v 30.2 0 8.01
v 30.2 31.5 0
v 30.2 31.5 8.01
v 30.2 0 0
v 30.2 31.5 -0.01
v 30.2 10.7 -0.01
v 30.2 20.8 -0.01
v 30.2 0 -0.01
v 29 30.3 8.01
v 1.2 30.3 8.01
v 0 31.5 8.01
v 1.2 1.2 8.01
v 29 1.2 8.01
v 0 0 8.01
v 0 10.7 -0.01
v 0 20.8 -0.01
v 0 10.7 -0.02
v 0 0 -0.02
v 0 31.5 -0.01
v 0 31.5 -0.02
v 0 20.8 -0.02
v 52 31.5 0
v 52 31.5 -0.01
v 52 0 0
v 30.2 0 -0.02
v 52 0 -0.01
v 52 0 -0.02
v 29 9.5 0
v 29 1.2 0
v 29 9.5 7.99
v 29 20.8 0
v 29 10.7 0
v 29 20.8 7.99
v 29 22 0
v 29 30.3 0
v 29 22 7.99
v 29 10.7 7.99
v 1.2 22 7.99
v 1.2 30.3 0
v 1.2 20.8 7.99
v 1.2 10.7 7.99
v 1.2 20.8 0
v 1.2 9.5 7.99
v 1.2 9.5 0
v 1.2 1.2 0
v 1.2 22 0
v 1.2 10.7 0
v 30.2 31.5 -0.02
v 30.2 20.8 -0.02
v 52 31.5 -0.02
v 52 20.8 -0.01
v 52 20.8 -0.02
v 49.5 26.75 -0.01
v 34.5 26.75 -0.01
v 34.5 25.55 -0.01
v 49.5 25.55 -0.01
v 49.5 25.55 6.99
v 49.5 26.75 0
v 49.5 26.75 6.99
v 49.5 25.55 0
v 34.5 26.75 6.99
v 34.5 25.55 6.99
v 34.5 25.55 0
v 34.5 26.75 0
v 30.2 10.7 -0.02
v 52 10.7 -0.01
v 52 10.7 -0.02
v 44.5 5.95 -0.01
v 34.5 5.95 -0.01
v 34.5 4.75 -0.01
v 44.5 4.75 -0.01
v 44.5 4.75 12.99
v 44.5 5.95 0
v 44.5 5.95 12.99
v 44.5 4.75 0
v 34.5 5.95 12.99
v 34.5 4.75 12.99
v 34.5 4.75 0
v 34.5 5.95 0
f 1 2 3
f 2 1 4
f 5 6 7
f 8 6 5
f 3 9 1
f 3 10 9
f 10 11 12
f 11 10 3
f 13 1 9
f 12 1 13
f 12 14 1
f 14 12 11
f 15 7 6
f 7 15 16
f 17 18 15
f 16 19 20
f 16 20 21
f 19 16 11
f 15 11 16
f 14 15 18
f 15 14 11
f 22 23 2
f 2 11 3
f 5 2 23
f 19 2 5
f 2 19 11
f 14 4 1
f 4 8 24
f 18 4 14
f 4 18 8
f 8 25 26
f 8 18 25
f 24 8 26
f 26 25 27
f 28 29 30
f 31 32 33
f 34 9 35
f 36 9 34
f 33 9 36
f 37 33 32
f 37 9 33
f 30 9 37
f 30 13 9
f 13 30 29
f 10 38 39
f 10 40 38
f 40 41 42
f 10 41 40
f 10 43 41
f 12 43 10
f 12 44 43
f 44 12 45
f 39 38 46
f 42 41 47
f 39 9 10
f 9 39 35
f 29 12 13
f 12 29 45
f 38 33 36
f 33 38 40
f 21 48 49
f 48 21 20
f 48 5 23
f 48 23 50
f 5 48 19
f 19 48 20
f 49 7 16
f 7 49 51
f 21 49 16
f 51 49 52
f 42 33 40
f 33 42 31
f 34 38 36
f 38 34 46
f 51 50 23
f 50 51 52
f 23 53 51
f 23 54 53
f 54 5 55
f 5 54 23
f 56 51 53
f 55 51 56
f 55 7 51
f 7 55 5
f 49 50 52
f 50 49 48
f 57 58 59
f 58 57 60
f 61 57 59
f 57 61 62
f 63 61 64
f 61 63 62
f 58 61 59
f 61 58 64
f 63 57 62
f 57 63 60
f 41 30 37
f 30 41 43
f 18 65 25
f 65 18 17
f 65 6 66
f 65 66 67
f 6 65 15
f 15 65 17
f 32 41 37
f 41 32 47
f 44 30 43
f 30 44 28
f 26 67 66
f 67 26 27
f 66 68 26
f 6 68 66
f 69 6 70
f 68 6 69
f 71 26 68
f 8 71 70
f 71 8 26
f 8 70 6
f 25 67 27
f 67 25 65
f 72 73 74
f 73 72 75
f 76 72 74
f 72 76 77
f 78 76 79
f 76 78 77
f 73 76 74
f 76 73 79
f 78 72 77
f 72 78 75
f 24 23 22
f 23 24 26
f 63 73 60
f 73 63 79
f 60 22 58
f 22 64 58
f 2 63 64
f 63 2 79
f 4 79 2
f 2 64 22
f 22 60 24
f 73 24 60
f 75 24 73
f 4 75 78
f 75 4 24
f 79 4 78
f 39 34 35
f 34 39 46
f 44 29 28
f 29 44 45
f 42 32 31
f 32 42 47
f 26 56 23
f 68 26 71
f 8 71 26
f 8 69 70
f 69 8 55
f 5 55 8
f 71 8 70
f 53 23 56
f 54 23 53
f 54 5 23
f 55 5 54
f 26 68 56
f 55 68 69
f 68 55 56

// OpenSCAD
// file: ../Base/Boxes.scad
// Fischertechnik Box Foundation
// Pre-designed Boxes

use <Constants.scad>

include <PlacementOptions.scad>

box190Width = 190;
box190Depth = 130;
box130Width = 130;
box130Depth = 95;
boxUsageHeight = 33.9;
boxWallThickness = 2.4;
boxBaseThickness = 1.0;
boxWebWidth = 3.0;

// getBoxWallThickness()
// Gets the wall thickness of a Fischertechnik Box

function getBoxWallThickness() = boxWallThickness;

// Gets the usable height of a fischertechnik box
function getBoxUsageHeight() = boxUsageHeight;

// Gets the thickness of the Fischertechnik box base.
function getBoxBaseThickness() = boxBaseThickness;

// Gets the width of a box web
function getBoxWebWidth() = boxWebWidth;

// Gets the usable inner space of a Box 190 as an x/y-list
function getBox190Space() = [
    box190Width - 2*getBoxWallThickness(), 
    box190Depth - 2*getBoxWallThickness() ];

// Imports the Fischertechnik empty box 130x190 mm and places it at position 0,0
// 190x130 are the outer sizes, the inner space is slightly smaller. Use getBox190Space() to get the inner sizes.
// This module needs the STL file "Fischertechnik Box 130x190.stl" in the library path.
// The box is positioned that the usable inner space is at the 0,0,0 position. The

module Box190() {
    translate([-getBoxWallThickness(),-getBoxWallThickness(),-getBoxBaseThickness()])
        import("Fischertechnik Box 130x190.stl", convexity=3);
}

// Gets the usable inner space of a Box 130 as an x/y-list
function getBox130Space() = [
    box130Width - 2*getBoxWallThickness(), 
    box130Depth - 2*getBoxWallThickness() ];

// Imports the Fischertechnik empty box 95x130 mm and places it at position 0,0
// 190x130 are the outer sizes, the inner space is slightly smaller. Use getBox190Space() to get the inner sizes.
// This module needs the STL file "Fischertechnik Box 95x130.stl" in the library path.
// The box is positioned that the usable inner space is at the 0,0,0 position. The

module Box130() {
    translate([-getBoxWallThickness(),-getBoxWallThickness(),-getBoxBaseThickness()])
        import("Fischertechnik Box 95x130.stl", convexity=3);
}

// Creates a web at the specified box walls
// corner 0 = LowerLeft, 1 = UpperLeft, 2 = UpperRight, 3 = LowerRight
// side 0 = LeftOfCorner, 1 = RightOfCorner
// distance = Distance in mm from the corner
// box = inner width and depth of the box (default: Box 190)
// webWidth = length of the web (default is 3 mms)
// webThickness = thickness of the web (default is 1 mm)

module BoxWeb(corner, side, distance, box=getBox190Space(), webWidth=getBoxWebWidth(), webThickness=1.0) {
    sink = getBoxWallThickness()/2;

    width = (corner % 2 == 0) ? 
            (side == LeftOfCorner ? webWidth : webThickness) :
            (side == LeftOfCorner ? webThickness : webWidth);

    depth = (corner % 2 == 0) ? 
            (side == RightOfCorner ? webWidth : webThickness) :
            (side == RightOfCorner ? webThickness : webWidth);
    
    xDiff = corner == LowerLeft ? 
                (side == LeftOfCorner ? -sink : distance) :
            (corner == UpperLeft ?                
                (side == LeftOfCorner ? distance : -sink) :
            (corner == UpperRight ?
                (side == LeftOfCorner ? box.x-webWidth+sink : box.x-distance-webThickness) :
                (side == LeftOfCorner ? box.x-distance-webThickness: box.x-webWidth+sink)));

    yDiff = corner == LowerLeft ? 
                (side == RightOfCorner ? -sink : distance) :
            (corner == UpperLeft ?
                (side == RightOfCorner ? box.y-distance : box.y-webWidth+sink) :
            (corner == UpperRight ?
                (side == RightOfCorner ? box.y-webWidth+sink : box.y-distance) :
                (side == RightOfCorner ? distance : -sink)));
    
    translate([xDiff, yDiff, -getExcess()])
        cube([width, depth, boxUsageHeight + 2*getExcess()]);
}
// file: ../Base/Alignment.scad
// Fischertechnik Box Foundation
// Geometry Helpers Alignment

include <PlacementOptions.scad>

// getAlignedX(elementWidth, spaceWidth, align=AlignRight, offset=0)
// Gets the aligned X offset of an element with the given
// width in the given space.
// elementWidth = The width of the element to positon
// spaceWidth = The space where the element should be aligned
// align = 0 AlignLeft, 1 AlignCenter, 2 AlignRight
// offset = an optional offset from the aligned position. When
// aligned left or centered, then positive values are in X direction.
// When aligned right then positive values are in negative X direction.

function getAlignedX(elementWidth, spaceWidth, align=AlignRight, offset=0) =
    (align == AlignLeft) ?
        offset :
        ((align == AlignCenter) ?
        (spaceWidth - elementWidth)/2 + offset :
        spaceWidth - offset - elementWidth);

// getAlignedY(elementDepth, spaceDepth, align=AlignTop, offset=0)
// Gets the aligned Y offset of an element with the given
// depth in the given space.
// elementDepth = The depth of the element to positon
// spaceDepth = The space where the element should be aligned
// align = 0 AlignBottom, 1 AlignCenter, 2 AlignTop
// offset = an optional offset from the aligned position. When
// aligned bottom or centered, then positive values are in Y direction.
// When aligned top then positive values are in negative Y direction.

function getAlignedY(elementDepth, spaceDepth, align=AlignTop, offset=0) =
    (align == AlignBottom) ?
        offset :
        ((align == AlignCenter) ?
        (spaceDepth - elementDepth)/2 + offset :
        spaceDepth - offset - elementDepth);
// file: ../Base/Rotation.scad
// Fischertechnik Box Foundation
// Geometry Helpers Rotation

include <PlacementOptions.scad>

// getRotatedSpace(space, rotation=NoRotation)
// Rotates the space dependent on the specified rotation

function getRotatedSpace(space, rotation=NoRotation) = [
    (rotation == Rotate90 || rotation == Rotate270) ? space.y : space.x,
    (rotation == Rotate90 || rotation == Rotate270) ? space.x : space.y
];

// Rotates the given space around the fixed left lower corner
// space = the space the children needs as width/depth list [width,depth]
// rotation = 0 Rotate0 degrees, 1 Rotate90 degrees, 2 Rotate180 degrees, 3 Rotate270 degrees (equivalent to -90)

module RotateFix(space, rotation=Rotate0) {
    dy = (rotation == Rotate0 || rotation == Rotate270) ? 0 :
        (rotation == Rotate90) ? space.x :
        space.y;
    dx = (rotation < Rotate180) ? 0 :
        (rotation == Rotate180) ? space.x :
        space.y;
    
    translate([dx, dy, 0])
        rotate([0, 0, rotations[rotation]])
            children();
}
// file: ../Base/Placement.scad
// Fischertechnik Box Foundation
// Geometry Helpers Placement

use <Constants.scad>
use <Alignment.scad>
use <Rotation.scad>
use <Boxes.scad>

include <PlacementOptions.scad>

// Place(x=0, y=0, elementSpace=[0,0], alignX=AlignLeft, alignY=AlignBottom, rotation=Rotate0, boxSpace=getBox190Space())
// Places the child at the specified position
// y = Y-Position. This is a relative position when an X aligment is specified.
// x = X-Position. This is a relative position when an Y aligment is specified.
// elementSpace = space of the element to be placed [x,y]
// alignX = -1=NoAlign, 0 AlignLeft, 1 AlignCenter, 3 AlignRight (elementSpace and boxSpace required!)
// alignY = -1=NoAlign, 2 AlignBottom, 1 AlignCenter, 4 AlignTop (elementSpace and boxSpace required!)
// rotation = 0 Rotate0 0 degrees, 1 Rotate90 90 degrees, 
// 2 Rotate180 180 degrees, 3 Rotate270 270 degrees (equivalent to -90)
// boxSpace = Inner space of the box where the placement occurs [x,y] - default is Box 190x130 inner space

module Place(x=0, y=0, elementSpace=[0,0], 
  alignX=AlignLeft, alignY=AlignBottom, 
  rotation=NoRotation, boxSpace=getBox190Space()) {

    module Position(x, y, space, rotation=Rotate0) {
        translate([x, y, 0])
            RotateFix(space, rotation)
                children();
    }

    space = getRotatedSpace(elementSpace, rotation);
    alignedX = getAlignedX(space.x, boxSpace.x, alignX, x);
    alignedY = getAlignedY(space.y, boxSpace.y, alignY, y);
    Position(alignedX, alignedY, elementSpace, rotation)
        children();
}

// Center(space=getBox130Space(), elementSpace=[0,0])
// space = Space where the children is centered. For cylinder use centered=true and no elementSpace.
// elementSpace = space of the element to be centered [x,y]

module Center(space=getBox190Space(), elementSpace=[0,0]) {
    translate([(space.x - elementSpace.x) / 2, (space.y - elementSpace.y) / 2])
        children(0);
}

// CenterHorizontal(width=0, y=0, offset=0, space=getBox130Space())
// space = Space where the children is centered. For cylinder use centered=true and no elementSpace.
// elementSpace = space of the element to be centered [x,y]

module CenterHorizontal(width=0, y=0, offset=0, space=getBox190Space()) {
    translate([(space.x - width) / 2 + offset, y])
        children(0);
}

// CenterVertical(depth=0, x=0, offset=0, space=getBox130Space())
// space = Space where the children is centered. For cylinder use centered=true and no elementSpace.
// elementSpace = space of the element to be centered [x,y]

module CenterVertical(depth=0, x=0, offset=0, space=getBox190Space()) {
    translate([x, (space.y - depth) / 2 + offset])
        children(0);
}
// file: ../Base/PlacementOptions.scad
// Fischertechnik Box Foundation
// Placement Options

// Alignment
NoAlign = 0;
AlignLeft = 1;
AlignBottom = 2;
AlignCenter = 3;
AlignRight = 4;
AlignTop = 5;

// Element rotation degree steps
rotations = [0, -90, -180, -270];

// Rotation
NoRotation = 0;
Rotate0 = 0;
Rotate90 = 1;
Rotate180 = 2;
Rotate270 = 3;

// Docking (seen from above)
NoDock = -1;
DockLeft = 0;
DockTop = 1;
DockRight = 2;
DockCorner = 2;
DockBottom = 3;

// Web corners
LowerLeft = 0;
UpperLeft = 1;
UpperRight = 2;
LowerRight = 3;

// Web position relative to corner
LeftOfCorner = 0;
RightOfCorner = 1;
// file: FrameBracketWithoutWorm.scad
// Fischertechnik Box Library
// Frame  for bracket without worm
// 31046

use <../Base/Constants.scad>
use <../ModelBase/Complex.scad>

// getFrameBracketWithoutWormSpace()
// Gets the space for a frame for a bracket with worm.

function getFrameBracketWithoutWormSpace() = getFrameBracketSpace();

// FrameBracketWithoutWorm()
// Frame for bracket with worm.

module FrameBracketWithoutWorm() {
    FrameBracket([ 10, getDividerThickness(), 13 ]);
}

// Test
color("lightgray")
FrameBracketWithoutWorm();
// file: FrameBracketWithWorm.scad
// Fischertechnik Box Library
// Frame  for bracket with worm
// 31045

use <../Base/Constants.scad>
use <../ModelBase/Complex.scad>

// getFrameBracketWithWormSpace()
// Gets the space for a frame for a bracket with worm.

function getFrameBracketWithWormSpace() = getFrameBracketSpace();

// FrameBracketWithWorm()
// Frame for bracket with worm.

module FrameBracketWithWorm() {
    FrameBracket([ 15, getDividerThickness(), 7 ]);
}

// Test
color("lightgray")
FrameBracketWithWorm();
// file: ../Base/Deployment.scad
// Fischertechnik Box Foundation
// Geometry Helpers Deployment

use <Constants.scad>
use <Placement.scad>
use <Rotation.scad>

include <PlacementOptions.scad>

// getWidth(spaces, rotations, count, i=0)
// Gets the sum of the width of count specified spaces, including rotations for each space.
// spaces = List of spaces from which the width should be added. Used internally for DeployRow.
// rotations = specify rotations for each space to get its correct width
// count = The count of spaces from the specified spaces that should be included in the sum (for recursive call)
// i = The space index offset used to start to add (for recursive call)

function getWidth(spaces, rotations, count, i=0) = 
    (i < count) ? 
        getRotatedSpace(spaces[i], rotations[i]).x + getWidth(spaces, rotations, count, i+1) : 
        0;

// getX(spaces, rotations, distance, i)
// Calculates the X position of the space with the index i, when the spaces are placed with the given
// equal distances. Used internally for DeployRow.
// spaces = List of spaces from which the width should be added
// rotations = specify rotations for each space to get its correct width
// distance = Equal distance between each space
// i = Index of the space to get its X position for

function getX(spaces, rotations, distance, i) = 
    (i == 0) ? 
        0 :
        (getRotatedSpace(spaces[i-1], rotations[i-1]).x + distance + getX(spaces, rotations, distance, i-1));

// DeployHorizontal(width, spaces, rotations)
// Deploys the elements in the specified width with equal distances.
// rowWidth = The width of the row in mm.
// spaces = The spaces of all elements to deploy.
// rotations = The rotations of each element: 0 Rotate0 0 degrees, 1 Rotate90 90 degrees, 
// 2 Rotate180 180 degrees, 3 Rotate270 270 degrees (equivalent to -90).

module DeployHorizontal(rowWidth, spaces, rotations) {
    distance = (rowWidth - getWidth(spaces, rotations, len(spaces))) / (len(spaces)-1);
    
    for (i = [0:1:$children-1]) {
        x = getX(spaces, rotations, distance, i);
        translate([x, 0])
            RotateFix(spaces[i], rotations[i])
                children(i);
    }
}

// getDepth(spaces)
// Gets the sum of the depth of count specified spaces.
// spaces = List of spaces from which the width should be added. Used internally for DeployRow.
// rotations = specify rotations for each space to get its correct width
// count = The count of spaces from the specified spaces that should be included in the sum
// i = The space index offset used to start to add

function getDepthSum(spaces, i=0) = 
    (i < len(spaces)) ? 
        spaces[i].y + getDepthSum(spaces, i+1) : 
        0;

// getY(spaces, distance, i)
// Gets the Y-distance the spaces plus constant distance 
// between each space needs.
// spaces = Spaces of each element to deploy vertically. Only
// the depth (y) is used.
// distance = distance between each space when deployed.
// i = The highest index of the spaces used

function getY(spaces, distance, i) = 
    (i == 0) ? 
        0 :
        spaces[i].y + distance + getY(spaces, distance, i-1);

// DeployVertical(depth, spaces)
// Deploys the child elements in the specified depth vertically.
// depth = Depth of the space where the elements should be deployed.
// spaces = Spaces of all elements. Only the depth (y) will be used.

module DeployVertical(depth, spaces) {
    distance = (depth - getDepthSum(spaces)) / (len(spaces)-1);
    count = $children - 1;
    
    for (i = [0:1:$children-1]) {
        y = getY(spaces, distance, count-i);
        translate([0, y, -getExcess()])
            children(i);
    }
}

// DeploySame(space, elementSpace, columns=2, rows=1, rotation=Rotate0)
// Deploys columns and rows of the specified child in the specified space with
// equal distances
// space = The space where the element copies are deployed
// elementSpace = The space the child needs
// columns = Count of elements per row
// rows = Count of rows deployed
// rotation = The rotation of the child that will be applied

module DeploySame(space, elementSpace, columns=2, rows=1, rotation=Rotate0) {
    
    elementWidth = getRotatedSpace(elementSpace, rotation).x;
    columnDistance = (space.x - columns * elementWidth) / (columns > 1 ? columns - 1 : 1);
    endColumnOffset = space.x - elementWidth;
    columnOffsetStep = elementWidth + columnDistance;
    
    elementDepth = getRotatedSpace(elementSpace, rotation).y;
    rowDistance = (space.y - rows * elementDepth) / (rows > 1 ? rows - 1 : 1);
    endRowOffset = space.y - elementDepth;
    rowOffsetStep = elementDepth + rowDistance;
    
    for (rowOffset = [0:rowOffsetStep:endRowOffset]) {
        for (columnOffset = [0:columnOffsetStep:endColumnOffset]) {
            translate([columnOffset, rowOffset])
                RotateFix(elementSpace, rotation)
                    children(0);
        }
    }
}

// getMergedRowWidth(spaces, rotations, count, i=0)
// Gets the width of the merged spaces with the specified rotations.
// Merging works all elements with two frame walls. 
// The right and left walls are merged into one single wall.
// spaces = List of spaces from which the width should be added.
// rotations = specify rotations for each space to get its correct width
// count = The count of spaces from the specified spaces that should be included in the sum (for recursive call)
// i = The space index offset used to start to add (for recursive call)

function getMergedRowWidth(spaces, rotations, count, i=0) =
    (i < count) ? 
        getRotatedSpace(spaces[i], rotations[i]).x + getWidth(spaces, rotations, count, i+1) - (i > 0 ? getDividerThickness() : 0) : 
        0;

// MergeRow(spaces, rotations, dividerThickness=0.8)
// Deploys the children so that all walls of the neighbors are merged in a single common wall.
// spaces = List of spaces of the children to get the sizes from.
// rotations = specify rotations for each space to get its correct width
// dividerThickness = Thickness of all dividers of the elements (default is 0.8)

module MergeRow(spaces, rotations, dividerThickness = getDividerThickness()) {
    for (i = [0:1:$children-1]) {
        x = getX(spaces, rotations, -getDividerThickness(), i);
        translate([x, 0, 0])
            RotateFix(spaces[i], rotations[i])
                children(i);
    }
}

// Merge(count, space, rotation, dividerThickness=0.8)
// Deploys the child count times so that all walls of the neighbors are merged in a single common wall.
// space = Space of the child to get the sizes from.
// rotation = rotation of the child to get the correct width
// dividerThickness = Thickness of all dividers of the element (default is 0.8)

module Merge(count, space, rotation, dividerThickness = getDividerThickness()) {
    x = getRotatedSpace(space, rotation).x - getDividerThickness();
    for (offset = [0:x:(count-1)*x]) {
        echo(offset);
        translate([offset, 0, 0])
            RotateFix(space, rotation)
                children(0);
    }
}
// file: ../Base/Constants.scad
// Fischertechnik Box Foundation
// Constants

// Constant values necessary for multiple elements

// Base constants
dividerThickness = 1.2;
excess = 0.01;
fragments = 90;
tolerance = 0.8;

// Gets the thickness of a divider 
function getDividerThickness() = dividerThickness;

// Gets the excess that is used to merge walls into each other
function getExcess() = excess;

// Gets amount of fragments of a cylinder
function getFragments() = fragments;

// Gets the inner tolerance of a frame to each side
function getTolerance() = tolerance;


// Fischertechnik specific constants
axisDiameter = 4;
axisBottomDiameter = axisDiameter + 1;
standardEdgeDistance = 2.5;
standardWebDistance = 11.5;
standardCornerLength = 15;
tubeWallFactor = 0.8;

// Gets axis diameter
function getAxisDiameter() = axisDiameter;

// Gets axis bottom diameter for thicker part at the bottom
function getAxisBottomDiameter() = axisBottomDiameter;

// gets the standard distance to the wall of the box for dockable frames with webs
function getStandardEdgeDistance() = standardEdgeDistance;

// gets the standard distance of each web to the corner of the dockable frame
function getStandardWebDistance() = standardWebDistance;

// gets the standard length of the corner walls of a dockable frame
function getStandardCornerLength() = standardCornerLength;

// gets the wall thickness of a tube.
function getTubeWallThickness() = tubeWallFactor * getDividerThickness();
// main file
// Fischertechnik Box Library
// Frames for brackets with and without worm
// 31045 + 31046

use <../Base/Constants.scad>
use <../Base/Deployment.scad>
use <../ModelBase/Simple.scad>
use <../ModelBase/Complex.scad>
use <FrameBracketWithWorm.scad>
use <FrameBracketWithoutWorm.scad>

include <../Base/PlacementOptions.scad>

outerDepth = 31.5;

// getFrameBracketComboSpace()
// Gets the space for a frame for a combination of brackets with worm and without worm.

function getFrameBracketComboSpace() = [getFrameBracketSpace().x, outerDepth];

// FrameBracketCombo()
// Frame for a combination of brackets with worm and without worm.

module FrameBracketCombo() {
    Space(getFrameBracketComboSpace());
    Frame([getFrameBracketWidth(), outerDepth - 2*getDividerThickness() - getTolerance(), getFrameBracketSpace().z]);
    DeployVertical(outerDepth, [getFrameBracketWithWormSpace(), getFrameBracketWithoutWormSpace()]) {
        FrameBracketWithWorm();
        FrameBracketWithoutWorm();
    }
}

// Test
color("lightgray")
FrameBracketCombo();
